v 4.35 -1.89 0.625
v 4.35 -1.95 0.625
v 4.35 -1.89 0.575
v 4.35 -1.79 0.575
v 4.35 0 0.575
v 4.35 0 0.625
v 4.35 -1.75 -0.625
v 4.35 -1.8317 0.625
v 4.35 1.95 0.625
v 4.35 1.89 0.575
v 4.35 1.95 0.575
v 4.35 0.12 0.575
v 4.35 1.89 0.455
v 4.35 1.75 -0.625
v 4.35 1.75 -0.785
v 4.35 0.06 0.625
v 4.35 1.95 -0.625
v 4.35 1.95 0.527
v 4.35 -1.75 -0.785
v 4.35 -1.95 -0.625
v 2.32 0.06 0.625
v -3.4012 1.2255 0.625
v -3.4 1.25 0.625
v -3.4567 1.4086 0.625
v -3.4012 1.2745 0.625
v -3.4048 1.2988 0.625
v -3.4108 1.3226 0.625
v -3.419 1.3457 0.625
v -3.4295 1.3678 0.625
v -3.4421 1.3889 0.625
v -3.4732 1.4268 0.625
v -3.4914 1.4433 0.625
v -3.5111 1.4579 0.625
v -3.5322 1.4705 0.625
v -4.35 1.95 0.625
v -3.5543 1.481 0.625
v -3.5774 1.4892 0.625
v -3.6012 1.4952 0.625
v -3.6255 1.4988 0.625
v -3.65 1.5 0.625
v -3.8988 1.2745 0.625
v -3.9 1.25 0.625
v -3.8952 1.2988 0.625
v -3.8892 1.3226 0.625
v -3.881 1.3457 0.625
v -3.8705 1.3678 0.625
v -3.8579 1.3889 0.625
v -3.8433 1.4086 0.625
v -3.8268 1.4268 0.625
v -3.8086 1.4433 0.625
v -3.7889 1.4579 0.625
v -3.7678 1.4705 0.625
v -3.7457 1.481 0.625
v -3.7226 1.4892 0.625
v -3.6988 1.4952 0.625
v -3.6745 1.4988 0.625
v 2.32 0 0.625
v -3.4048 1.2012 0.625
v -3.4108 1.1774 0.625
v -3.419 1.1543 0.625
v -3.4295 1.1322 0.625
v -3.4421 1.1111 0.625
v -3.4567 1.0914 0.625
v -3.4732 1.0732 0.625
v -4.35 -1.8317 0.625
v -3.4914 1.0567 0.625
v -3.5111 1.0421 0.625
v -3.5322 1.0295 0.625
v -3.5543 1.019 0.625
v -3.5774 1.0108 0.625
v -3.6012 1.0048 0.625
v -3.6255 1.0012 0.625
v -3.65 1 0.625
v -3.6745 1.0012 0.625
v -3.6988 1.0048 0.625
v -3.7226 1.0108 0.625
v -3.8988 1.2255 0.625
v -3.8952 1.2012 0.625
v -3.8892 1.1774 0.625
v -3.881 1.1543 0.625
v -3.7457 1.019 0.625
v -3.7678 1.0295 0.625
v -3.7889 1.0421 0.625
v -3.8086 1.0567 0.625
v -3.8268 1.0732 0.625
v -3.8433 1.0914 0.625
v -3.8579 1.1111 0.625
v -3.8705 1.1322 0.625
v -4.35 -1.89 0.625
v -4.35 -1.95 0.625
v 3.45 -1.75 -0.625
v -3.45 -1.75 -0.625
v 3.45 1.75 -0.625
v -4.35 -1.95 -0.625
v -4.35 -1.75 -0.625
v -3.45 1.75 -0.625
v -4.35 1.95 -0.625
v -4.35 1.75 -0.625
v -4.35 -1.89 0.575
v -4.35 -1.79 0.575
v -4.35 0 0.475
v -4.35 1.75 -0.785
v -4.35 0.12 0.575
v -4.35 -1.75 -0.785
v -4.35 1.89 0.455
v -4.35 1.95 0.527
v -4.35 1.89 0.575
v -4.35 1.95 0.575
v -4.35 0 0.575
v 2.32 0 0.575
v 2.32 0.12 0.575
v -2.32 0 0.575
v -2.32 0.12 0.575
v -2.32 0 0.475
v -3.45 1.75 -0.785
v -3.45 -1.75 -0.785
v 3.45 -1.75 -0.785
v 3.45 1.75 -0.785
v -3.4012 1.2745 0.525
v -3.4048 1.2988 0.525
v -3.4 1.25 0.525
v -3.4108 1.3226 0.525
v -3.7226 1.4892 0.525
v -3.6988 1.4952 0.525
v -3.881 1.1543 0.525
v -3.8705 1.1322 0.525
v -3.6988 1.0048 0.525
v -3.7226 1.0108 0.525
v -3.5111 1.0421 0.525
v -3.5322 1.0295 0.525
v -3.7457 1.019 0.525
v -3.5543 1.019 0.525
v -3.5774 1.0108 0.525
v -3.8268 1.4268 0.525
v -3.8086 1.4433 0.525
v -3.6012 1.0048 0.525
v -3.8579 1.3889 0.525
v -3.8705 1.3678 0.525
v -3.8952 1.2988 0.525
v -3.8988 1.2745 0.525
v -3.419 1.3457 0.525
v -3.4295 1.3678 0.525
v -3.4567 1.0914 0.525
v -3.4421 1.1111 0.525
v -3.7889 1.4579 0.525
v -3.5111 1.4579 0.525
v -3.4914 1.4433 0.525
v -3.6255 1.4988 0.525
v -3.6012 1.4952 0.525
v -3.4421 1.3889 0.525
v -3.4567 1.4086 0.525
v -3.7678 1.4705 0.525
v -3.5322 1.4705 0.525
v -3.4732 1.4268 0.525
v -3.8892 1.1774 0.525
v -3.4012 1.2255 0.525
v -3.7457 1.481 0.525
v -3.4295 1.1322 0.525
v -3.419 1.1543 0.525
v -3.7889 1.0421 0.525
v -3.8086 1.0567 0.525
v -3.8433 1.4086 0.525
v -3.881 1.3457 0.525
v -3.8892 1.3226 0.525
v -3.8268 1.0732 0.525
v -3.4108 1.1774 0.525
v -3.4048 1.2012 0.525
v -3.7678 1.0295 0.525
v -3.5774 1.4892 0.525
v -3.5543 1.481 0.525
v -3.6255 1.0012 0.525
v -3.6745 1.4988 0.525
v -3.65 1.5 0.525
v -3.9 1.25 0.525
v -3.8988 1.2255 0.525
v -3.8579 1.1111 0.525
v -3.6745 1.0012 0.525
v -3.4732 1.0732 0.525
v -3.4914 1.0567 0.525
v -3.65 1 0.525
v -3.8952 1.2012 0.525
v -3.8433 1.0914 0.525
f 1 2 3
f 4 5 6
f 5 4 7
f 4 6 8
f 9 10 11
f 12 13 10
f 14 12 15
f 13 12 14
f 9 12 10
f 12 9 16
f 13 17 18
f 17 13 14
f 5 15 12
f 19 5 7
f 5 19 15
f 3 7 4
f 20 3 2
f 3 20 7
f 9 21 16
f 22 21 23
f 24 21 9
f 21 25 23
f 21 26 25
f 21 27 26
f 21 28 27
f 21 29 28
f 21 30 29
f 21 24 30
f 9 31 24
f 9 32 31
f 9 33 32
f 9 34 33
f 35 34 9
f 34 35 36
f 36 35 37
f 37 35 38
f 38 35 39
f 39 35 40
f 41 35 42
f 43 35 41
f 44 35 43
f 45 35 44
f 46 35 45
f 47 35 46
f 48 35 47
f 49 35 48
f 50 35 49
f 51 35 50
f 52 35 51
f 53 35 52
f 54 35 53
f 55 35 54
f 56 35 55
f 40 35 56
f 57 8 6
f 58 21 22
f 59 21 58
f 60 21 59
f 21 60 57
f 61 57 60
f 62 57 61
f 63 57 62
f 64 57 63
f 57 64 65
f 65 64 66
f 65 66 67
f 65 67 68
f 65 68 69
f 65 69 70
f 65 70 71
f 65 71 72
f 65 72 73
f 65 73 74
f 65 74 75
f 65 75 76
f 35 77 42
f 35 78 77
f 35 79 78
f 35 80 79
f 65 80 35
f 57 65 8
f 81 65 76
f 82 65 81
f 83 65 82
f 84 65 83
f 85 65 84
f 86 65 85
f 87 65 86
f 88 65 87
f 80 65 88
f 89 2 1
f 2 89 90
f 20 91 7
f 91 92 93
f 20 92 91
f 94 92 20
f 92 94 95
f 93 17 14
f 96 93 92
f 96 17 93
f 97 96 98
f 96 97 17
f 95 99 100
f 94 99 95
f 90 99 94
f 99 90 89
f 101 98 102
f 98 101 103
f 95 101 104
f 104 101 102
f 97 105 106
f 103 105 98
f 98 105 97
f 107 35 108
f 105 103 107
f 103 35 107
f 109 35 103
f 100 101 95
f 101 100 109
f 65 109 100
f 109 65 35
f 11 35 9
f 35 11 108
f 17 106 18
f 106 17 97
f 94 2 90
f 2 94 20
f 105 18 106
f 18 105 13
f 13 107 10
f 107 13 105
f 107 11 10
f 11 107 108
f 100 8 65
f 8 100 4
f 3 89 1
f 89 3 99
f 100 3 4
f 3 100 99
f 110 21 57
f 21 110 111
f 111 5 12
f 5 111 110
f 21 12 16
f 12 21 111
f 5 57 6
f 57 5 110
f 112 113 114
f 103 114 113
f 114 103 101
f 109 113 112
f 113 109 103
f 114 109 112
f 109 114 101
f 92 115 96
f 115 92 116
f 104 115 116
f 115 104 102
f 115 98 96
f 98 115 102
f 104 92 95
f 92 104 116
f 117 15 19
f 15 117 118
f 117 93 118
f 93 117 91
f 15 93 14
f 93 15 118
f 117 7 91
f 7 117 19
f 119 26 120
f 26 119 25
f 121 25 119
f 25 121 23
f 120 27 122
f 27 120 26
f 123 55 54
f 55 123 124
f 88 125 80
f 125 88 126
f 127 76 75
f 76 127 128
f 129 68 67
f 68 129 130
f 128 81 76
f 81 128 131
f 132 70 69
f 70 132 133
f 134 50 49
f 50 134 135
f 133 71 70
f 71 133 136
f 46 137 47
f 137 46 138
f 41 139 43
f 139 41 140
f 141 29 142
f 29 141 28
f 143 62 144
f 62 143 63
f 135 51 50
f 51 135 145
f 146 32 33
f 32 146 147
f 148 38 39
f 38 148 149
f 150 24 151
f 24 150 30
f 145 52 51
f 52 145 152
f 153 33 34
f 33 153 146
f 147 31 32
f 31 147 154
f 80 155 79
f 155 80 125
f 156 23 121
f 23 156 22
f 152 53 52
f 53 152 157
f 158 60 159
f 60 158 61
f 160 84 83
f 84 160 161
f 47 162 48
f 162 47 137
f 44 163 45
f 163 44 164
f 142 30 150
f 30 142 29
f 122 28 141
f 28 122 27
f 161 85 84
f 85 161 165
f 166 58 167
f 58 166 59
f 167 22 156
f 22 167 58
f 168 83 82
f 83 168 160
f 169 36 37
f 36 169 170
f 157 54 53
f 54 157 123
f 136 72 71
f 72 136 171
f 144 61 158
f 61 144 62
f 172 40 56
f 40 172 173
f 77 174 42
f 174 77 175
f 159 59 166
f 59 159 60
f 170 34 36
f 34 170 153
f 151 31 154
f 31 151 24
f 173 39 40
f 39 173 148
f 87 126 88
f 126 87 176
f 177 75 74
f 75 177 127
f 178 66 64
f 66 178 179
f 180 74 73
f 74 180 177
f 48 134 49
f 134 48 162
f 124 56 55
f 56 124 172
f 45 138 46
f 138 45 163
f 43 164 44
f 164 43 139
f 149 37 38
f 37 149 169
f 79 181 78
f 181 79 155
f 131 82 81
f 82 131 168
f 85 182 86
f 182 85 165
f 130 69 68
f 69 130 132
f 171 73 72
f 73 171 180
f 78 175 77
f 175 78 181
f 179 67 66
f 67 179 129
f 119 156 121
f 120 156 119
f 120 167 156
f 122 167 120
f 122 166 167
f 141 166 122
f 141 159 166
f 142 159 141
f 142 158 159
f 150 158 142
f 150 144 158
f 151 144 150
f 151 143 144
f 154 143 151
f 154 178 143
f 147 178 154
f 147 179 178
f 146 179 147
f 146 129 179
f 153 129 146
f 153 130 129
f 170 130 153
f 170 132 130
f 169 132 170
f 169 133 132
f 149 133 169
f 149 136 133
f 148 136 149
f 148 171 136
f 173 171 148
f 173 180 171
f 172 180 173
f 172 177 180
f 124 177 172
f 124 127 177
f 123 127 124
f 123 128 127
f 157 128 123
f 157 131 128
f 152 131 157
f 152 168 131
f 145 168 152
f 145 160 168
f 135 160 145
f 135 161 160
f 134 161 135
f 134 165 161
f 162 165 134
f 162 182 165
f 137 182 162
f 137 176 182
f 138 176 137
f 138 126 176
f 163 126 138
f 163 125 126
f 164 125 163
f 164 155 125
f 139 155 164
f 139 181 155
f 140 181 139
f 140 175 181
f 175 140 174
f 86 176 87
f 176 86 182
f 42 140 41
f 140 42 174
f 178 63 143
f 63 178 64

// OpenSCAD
// Simple SMD package (one connected solid)
// Target overall size: [8.70, 3.90, 1.25] (L, W, H)

body_L = 8.70;
body_W = 3.90;
body_H = 1.25;

// Small top-edge bevel (kept subtle; does not change overall size)
edge_bevel = 0.12;   // mm
bevel_h    = 0.10;   // mm (height of bevel region from top)

// Pin-1 polarity mark (engraved dot on top)
mark_r     = 0.25;   // mm
mark_depth = 0.08;   // mm
mark_inset = 0.70;   // mm from left and top edges

// Bottom terminations (simple end pads as part of the solid)
pad_L      = 0.90;   // mm (length along L)
pad_H      = 0.18;   // mm (thickness below body)
pad_insetW = 0.20;   // mm inset from each side edge

overlap = 0.02;
$fn = 64;

function clamp(v, lo, hi) = v < lo ? lo : (v > hi ? hi : v);

eb = clamp(edge_bevel, 0, min(body_L, body_W)/2 - 0.01);
bh = clamp(bevel_h, 0, body_H - 0.01);
md = clamp(mark_depth, 0, body_H - 0.01);

module body_with_top_bevel() {
  // Keep overall size exactly [body_L, body_W, body_H]
  // by beveling only within the top region.
  difference() {
    cube([body_L, body_W, body_H], center=true);

    // Four top-edge bevel cuts (long wedges along each side)
    // +Y edge
    translate([0,  body_W/2 - eb/2, body_H/2 - bh/2])
      rotate([0, 90, 0])
        linear_extrude(height=body_L + 2*overlap, center=true)
          polygon(points=[[0,0],[eb,0],[0,bh]]);
    // -Y edge
    translate([0, -body_W/2 + eb/2, body_H/2 - bh/2])
      rotate([0,-90, 0])
        linear_extrude(height=body_L + 2*overlap, center=true)
          polygon(points=[[0,0],[eb,0],[0,bh]]);
    // +X edge
    translate([ body_L/2 - eb/2, 0, body_H/2 - bh/2])
      rotate([90, 0, 90])
        linear_extrude(height=body_W + 2*overlap, center=true)
          polygon(points=[[0,0],[eb,0],[0,bh]]);
    // -X edge
    translate([-body_L/2 + eb/2, 0, body_H/2 - bh/2])
      rotate([-90,0, 90])
        linear_extrude(height=body_W + 2*overlap, center=true)
          polygon(points=[[0,0],[eb,0],[0,bh]]);
  }
}

module pin1_mark_cut() {
  // Engraved dot near top-left corner on the top face
  translate([
      -body_L/2 + mark_inset,
       body_W/2 - mark_inset,
       body_H/2 - md/2
    ])
    cylinder(r=mark_r, h=md + 2*overlap, center=true);
}

module end_pad(side) {
  // side = -1 (left), +1 (right)
  // Pads are attached to the bottom, protruding slightly below the body.
  pad_W = body_W - 2*pad_insetW;

  translate([
      side*(body_L/2 - pad_L/2),
      0,
      -body_H/2 - pad_H/2 + overlap
    ])
    cube([pad_L, pad_W, pad_H], center=true);
}

module smd_package() {
  difference() {
    union() {
      body_with_top_bevel();
      end_pad(-1);
      end_pad( 1);
    }
    pin1_mark_cut();
  }
}

smd_package();
